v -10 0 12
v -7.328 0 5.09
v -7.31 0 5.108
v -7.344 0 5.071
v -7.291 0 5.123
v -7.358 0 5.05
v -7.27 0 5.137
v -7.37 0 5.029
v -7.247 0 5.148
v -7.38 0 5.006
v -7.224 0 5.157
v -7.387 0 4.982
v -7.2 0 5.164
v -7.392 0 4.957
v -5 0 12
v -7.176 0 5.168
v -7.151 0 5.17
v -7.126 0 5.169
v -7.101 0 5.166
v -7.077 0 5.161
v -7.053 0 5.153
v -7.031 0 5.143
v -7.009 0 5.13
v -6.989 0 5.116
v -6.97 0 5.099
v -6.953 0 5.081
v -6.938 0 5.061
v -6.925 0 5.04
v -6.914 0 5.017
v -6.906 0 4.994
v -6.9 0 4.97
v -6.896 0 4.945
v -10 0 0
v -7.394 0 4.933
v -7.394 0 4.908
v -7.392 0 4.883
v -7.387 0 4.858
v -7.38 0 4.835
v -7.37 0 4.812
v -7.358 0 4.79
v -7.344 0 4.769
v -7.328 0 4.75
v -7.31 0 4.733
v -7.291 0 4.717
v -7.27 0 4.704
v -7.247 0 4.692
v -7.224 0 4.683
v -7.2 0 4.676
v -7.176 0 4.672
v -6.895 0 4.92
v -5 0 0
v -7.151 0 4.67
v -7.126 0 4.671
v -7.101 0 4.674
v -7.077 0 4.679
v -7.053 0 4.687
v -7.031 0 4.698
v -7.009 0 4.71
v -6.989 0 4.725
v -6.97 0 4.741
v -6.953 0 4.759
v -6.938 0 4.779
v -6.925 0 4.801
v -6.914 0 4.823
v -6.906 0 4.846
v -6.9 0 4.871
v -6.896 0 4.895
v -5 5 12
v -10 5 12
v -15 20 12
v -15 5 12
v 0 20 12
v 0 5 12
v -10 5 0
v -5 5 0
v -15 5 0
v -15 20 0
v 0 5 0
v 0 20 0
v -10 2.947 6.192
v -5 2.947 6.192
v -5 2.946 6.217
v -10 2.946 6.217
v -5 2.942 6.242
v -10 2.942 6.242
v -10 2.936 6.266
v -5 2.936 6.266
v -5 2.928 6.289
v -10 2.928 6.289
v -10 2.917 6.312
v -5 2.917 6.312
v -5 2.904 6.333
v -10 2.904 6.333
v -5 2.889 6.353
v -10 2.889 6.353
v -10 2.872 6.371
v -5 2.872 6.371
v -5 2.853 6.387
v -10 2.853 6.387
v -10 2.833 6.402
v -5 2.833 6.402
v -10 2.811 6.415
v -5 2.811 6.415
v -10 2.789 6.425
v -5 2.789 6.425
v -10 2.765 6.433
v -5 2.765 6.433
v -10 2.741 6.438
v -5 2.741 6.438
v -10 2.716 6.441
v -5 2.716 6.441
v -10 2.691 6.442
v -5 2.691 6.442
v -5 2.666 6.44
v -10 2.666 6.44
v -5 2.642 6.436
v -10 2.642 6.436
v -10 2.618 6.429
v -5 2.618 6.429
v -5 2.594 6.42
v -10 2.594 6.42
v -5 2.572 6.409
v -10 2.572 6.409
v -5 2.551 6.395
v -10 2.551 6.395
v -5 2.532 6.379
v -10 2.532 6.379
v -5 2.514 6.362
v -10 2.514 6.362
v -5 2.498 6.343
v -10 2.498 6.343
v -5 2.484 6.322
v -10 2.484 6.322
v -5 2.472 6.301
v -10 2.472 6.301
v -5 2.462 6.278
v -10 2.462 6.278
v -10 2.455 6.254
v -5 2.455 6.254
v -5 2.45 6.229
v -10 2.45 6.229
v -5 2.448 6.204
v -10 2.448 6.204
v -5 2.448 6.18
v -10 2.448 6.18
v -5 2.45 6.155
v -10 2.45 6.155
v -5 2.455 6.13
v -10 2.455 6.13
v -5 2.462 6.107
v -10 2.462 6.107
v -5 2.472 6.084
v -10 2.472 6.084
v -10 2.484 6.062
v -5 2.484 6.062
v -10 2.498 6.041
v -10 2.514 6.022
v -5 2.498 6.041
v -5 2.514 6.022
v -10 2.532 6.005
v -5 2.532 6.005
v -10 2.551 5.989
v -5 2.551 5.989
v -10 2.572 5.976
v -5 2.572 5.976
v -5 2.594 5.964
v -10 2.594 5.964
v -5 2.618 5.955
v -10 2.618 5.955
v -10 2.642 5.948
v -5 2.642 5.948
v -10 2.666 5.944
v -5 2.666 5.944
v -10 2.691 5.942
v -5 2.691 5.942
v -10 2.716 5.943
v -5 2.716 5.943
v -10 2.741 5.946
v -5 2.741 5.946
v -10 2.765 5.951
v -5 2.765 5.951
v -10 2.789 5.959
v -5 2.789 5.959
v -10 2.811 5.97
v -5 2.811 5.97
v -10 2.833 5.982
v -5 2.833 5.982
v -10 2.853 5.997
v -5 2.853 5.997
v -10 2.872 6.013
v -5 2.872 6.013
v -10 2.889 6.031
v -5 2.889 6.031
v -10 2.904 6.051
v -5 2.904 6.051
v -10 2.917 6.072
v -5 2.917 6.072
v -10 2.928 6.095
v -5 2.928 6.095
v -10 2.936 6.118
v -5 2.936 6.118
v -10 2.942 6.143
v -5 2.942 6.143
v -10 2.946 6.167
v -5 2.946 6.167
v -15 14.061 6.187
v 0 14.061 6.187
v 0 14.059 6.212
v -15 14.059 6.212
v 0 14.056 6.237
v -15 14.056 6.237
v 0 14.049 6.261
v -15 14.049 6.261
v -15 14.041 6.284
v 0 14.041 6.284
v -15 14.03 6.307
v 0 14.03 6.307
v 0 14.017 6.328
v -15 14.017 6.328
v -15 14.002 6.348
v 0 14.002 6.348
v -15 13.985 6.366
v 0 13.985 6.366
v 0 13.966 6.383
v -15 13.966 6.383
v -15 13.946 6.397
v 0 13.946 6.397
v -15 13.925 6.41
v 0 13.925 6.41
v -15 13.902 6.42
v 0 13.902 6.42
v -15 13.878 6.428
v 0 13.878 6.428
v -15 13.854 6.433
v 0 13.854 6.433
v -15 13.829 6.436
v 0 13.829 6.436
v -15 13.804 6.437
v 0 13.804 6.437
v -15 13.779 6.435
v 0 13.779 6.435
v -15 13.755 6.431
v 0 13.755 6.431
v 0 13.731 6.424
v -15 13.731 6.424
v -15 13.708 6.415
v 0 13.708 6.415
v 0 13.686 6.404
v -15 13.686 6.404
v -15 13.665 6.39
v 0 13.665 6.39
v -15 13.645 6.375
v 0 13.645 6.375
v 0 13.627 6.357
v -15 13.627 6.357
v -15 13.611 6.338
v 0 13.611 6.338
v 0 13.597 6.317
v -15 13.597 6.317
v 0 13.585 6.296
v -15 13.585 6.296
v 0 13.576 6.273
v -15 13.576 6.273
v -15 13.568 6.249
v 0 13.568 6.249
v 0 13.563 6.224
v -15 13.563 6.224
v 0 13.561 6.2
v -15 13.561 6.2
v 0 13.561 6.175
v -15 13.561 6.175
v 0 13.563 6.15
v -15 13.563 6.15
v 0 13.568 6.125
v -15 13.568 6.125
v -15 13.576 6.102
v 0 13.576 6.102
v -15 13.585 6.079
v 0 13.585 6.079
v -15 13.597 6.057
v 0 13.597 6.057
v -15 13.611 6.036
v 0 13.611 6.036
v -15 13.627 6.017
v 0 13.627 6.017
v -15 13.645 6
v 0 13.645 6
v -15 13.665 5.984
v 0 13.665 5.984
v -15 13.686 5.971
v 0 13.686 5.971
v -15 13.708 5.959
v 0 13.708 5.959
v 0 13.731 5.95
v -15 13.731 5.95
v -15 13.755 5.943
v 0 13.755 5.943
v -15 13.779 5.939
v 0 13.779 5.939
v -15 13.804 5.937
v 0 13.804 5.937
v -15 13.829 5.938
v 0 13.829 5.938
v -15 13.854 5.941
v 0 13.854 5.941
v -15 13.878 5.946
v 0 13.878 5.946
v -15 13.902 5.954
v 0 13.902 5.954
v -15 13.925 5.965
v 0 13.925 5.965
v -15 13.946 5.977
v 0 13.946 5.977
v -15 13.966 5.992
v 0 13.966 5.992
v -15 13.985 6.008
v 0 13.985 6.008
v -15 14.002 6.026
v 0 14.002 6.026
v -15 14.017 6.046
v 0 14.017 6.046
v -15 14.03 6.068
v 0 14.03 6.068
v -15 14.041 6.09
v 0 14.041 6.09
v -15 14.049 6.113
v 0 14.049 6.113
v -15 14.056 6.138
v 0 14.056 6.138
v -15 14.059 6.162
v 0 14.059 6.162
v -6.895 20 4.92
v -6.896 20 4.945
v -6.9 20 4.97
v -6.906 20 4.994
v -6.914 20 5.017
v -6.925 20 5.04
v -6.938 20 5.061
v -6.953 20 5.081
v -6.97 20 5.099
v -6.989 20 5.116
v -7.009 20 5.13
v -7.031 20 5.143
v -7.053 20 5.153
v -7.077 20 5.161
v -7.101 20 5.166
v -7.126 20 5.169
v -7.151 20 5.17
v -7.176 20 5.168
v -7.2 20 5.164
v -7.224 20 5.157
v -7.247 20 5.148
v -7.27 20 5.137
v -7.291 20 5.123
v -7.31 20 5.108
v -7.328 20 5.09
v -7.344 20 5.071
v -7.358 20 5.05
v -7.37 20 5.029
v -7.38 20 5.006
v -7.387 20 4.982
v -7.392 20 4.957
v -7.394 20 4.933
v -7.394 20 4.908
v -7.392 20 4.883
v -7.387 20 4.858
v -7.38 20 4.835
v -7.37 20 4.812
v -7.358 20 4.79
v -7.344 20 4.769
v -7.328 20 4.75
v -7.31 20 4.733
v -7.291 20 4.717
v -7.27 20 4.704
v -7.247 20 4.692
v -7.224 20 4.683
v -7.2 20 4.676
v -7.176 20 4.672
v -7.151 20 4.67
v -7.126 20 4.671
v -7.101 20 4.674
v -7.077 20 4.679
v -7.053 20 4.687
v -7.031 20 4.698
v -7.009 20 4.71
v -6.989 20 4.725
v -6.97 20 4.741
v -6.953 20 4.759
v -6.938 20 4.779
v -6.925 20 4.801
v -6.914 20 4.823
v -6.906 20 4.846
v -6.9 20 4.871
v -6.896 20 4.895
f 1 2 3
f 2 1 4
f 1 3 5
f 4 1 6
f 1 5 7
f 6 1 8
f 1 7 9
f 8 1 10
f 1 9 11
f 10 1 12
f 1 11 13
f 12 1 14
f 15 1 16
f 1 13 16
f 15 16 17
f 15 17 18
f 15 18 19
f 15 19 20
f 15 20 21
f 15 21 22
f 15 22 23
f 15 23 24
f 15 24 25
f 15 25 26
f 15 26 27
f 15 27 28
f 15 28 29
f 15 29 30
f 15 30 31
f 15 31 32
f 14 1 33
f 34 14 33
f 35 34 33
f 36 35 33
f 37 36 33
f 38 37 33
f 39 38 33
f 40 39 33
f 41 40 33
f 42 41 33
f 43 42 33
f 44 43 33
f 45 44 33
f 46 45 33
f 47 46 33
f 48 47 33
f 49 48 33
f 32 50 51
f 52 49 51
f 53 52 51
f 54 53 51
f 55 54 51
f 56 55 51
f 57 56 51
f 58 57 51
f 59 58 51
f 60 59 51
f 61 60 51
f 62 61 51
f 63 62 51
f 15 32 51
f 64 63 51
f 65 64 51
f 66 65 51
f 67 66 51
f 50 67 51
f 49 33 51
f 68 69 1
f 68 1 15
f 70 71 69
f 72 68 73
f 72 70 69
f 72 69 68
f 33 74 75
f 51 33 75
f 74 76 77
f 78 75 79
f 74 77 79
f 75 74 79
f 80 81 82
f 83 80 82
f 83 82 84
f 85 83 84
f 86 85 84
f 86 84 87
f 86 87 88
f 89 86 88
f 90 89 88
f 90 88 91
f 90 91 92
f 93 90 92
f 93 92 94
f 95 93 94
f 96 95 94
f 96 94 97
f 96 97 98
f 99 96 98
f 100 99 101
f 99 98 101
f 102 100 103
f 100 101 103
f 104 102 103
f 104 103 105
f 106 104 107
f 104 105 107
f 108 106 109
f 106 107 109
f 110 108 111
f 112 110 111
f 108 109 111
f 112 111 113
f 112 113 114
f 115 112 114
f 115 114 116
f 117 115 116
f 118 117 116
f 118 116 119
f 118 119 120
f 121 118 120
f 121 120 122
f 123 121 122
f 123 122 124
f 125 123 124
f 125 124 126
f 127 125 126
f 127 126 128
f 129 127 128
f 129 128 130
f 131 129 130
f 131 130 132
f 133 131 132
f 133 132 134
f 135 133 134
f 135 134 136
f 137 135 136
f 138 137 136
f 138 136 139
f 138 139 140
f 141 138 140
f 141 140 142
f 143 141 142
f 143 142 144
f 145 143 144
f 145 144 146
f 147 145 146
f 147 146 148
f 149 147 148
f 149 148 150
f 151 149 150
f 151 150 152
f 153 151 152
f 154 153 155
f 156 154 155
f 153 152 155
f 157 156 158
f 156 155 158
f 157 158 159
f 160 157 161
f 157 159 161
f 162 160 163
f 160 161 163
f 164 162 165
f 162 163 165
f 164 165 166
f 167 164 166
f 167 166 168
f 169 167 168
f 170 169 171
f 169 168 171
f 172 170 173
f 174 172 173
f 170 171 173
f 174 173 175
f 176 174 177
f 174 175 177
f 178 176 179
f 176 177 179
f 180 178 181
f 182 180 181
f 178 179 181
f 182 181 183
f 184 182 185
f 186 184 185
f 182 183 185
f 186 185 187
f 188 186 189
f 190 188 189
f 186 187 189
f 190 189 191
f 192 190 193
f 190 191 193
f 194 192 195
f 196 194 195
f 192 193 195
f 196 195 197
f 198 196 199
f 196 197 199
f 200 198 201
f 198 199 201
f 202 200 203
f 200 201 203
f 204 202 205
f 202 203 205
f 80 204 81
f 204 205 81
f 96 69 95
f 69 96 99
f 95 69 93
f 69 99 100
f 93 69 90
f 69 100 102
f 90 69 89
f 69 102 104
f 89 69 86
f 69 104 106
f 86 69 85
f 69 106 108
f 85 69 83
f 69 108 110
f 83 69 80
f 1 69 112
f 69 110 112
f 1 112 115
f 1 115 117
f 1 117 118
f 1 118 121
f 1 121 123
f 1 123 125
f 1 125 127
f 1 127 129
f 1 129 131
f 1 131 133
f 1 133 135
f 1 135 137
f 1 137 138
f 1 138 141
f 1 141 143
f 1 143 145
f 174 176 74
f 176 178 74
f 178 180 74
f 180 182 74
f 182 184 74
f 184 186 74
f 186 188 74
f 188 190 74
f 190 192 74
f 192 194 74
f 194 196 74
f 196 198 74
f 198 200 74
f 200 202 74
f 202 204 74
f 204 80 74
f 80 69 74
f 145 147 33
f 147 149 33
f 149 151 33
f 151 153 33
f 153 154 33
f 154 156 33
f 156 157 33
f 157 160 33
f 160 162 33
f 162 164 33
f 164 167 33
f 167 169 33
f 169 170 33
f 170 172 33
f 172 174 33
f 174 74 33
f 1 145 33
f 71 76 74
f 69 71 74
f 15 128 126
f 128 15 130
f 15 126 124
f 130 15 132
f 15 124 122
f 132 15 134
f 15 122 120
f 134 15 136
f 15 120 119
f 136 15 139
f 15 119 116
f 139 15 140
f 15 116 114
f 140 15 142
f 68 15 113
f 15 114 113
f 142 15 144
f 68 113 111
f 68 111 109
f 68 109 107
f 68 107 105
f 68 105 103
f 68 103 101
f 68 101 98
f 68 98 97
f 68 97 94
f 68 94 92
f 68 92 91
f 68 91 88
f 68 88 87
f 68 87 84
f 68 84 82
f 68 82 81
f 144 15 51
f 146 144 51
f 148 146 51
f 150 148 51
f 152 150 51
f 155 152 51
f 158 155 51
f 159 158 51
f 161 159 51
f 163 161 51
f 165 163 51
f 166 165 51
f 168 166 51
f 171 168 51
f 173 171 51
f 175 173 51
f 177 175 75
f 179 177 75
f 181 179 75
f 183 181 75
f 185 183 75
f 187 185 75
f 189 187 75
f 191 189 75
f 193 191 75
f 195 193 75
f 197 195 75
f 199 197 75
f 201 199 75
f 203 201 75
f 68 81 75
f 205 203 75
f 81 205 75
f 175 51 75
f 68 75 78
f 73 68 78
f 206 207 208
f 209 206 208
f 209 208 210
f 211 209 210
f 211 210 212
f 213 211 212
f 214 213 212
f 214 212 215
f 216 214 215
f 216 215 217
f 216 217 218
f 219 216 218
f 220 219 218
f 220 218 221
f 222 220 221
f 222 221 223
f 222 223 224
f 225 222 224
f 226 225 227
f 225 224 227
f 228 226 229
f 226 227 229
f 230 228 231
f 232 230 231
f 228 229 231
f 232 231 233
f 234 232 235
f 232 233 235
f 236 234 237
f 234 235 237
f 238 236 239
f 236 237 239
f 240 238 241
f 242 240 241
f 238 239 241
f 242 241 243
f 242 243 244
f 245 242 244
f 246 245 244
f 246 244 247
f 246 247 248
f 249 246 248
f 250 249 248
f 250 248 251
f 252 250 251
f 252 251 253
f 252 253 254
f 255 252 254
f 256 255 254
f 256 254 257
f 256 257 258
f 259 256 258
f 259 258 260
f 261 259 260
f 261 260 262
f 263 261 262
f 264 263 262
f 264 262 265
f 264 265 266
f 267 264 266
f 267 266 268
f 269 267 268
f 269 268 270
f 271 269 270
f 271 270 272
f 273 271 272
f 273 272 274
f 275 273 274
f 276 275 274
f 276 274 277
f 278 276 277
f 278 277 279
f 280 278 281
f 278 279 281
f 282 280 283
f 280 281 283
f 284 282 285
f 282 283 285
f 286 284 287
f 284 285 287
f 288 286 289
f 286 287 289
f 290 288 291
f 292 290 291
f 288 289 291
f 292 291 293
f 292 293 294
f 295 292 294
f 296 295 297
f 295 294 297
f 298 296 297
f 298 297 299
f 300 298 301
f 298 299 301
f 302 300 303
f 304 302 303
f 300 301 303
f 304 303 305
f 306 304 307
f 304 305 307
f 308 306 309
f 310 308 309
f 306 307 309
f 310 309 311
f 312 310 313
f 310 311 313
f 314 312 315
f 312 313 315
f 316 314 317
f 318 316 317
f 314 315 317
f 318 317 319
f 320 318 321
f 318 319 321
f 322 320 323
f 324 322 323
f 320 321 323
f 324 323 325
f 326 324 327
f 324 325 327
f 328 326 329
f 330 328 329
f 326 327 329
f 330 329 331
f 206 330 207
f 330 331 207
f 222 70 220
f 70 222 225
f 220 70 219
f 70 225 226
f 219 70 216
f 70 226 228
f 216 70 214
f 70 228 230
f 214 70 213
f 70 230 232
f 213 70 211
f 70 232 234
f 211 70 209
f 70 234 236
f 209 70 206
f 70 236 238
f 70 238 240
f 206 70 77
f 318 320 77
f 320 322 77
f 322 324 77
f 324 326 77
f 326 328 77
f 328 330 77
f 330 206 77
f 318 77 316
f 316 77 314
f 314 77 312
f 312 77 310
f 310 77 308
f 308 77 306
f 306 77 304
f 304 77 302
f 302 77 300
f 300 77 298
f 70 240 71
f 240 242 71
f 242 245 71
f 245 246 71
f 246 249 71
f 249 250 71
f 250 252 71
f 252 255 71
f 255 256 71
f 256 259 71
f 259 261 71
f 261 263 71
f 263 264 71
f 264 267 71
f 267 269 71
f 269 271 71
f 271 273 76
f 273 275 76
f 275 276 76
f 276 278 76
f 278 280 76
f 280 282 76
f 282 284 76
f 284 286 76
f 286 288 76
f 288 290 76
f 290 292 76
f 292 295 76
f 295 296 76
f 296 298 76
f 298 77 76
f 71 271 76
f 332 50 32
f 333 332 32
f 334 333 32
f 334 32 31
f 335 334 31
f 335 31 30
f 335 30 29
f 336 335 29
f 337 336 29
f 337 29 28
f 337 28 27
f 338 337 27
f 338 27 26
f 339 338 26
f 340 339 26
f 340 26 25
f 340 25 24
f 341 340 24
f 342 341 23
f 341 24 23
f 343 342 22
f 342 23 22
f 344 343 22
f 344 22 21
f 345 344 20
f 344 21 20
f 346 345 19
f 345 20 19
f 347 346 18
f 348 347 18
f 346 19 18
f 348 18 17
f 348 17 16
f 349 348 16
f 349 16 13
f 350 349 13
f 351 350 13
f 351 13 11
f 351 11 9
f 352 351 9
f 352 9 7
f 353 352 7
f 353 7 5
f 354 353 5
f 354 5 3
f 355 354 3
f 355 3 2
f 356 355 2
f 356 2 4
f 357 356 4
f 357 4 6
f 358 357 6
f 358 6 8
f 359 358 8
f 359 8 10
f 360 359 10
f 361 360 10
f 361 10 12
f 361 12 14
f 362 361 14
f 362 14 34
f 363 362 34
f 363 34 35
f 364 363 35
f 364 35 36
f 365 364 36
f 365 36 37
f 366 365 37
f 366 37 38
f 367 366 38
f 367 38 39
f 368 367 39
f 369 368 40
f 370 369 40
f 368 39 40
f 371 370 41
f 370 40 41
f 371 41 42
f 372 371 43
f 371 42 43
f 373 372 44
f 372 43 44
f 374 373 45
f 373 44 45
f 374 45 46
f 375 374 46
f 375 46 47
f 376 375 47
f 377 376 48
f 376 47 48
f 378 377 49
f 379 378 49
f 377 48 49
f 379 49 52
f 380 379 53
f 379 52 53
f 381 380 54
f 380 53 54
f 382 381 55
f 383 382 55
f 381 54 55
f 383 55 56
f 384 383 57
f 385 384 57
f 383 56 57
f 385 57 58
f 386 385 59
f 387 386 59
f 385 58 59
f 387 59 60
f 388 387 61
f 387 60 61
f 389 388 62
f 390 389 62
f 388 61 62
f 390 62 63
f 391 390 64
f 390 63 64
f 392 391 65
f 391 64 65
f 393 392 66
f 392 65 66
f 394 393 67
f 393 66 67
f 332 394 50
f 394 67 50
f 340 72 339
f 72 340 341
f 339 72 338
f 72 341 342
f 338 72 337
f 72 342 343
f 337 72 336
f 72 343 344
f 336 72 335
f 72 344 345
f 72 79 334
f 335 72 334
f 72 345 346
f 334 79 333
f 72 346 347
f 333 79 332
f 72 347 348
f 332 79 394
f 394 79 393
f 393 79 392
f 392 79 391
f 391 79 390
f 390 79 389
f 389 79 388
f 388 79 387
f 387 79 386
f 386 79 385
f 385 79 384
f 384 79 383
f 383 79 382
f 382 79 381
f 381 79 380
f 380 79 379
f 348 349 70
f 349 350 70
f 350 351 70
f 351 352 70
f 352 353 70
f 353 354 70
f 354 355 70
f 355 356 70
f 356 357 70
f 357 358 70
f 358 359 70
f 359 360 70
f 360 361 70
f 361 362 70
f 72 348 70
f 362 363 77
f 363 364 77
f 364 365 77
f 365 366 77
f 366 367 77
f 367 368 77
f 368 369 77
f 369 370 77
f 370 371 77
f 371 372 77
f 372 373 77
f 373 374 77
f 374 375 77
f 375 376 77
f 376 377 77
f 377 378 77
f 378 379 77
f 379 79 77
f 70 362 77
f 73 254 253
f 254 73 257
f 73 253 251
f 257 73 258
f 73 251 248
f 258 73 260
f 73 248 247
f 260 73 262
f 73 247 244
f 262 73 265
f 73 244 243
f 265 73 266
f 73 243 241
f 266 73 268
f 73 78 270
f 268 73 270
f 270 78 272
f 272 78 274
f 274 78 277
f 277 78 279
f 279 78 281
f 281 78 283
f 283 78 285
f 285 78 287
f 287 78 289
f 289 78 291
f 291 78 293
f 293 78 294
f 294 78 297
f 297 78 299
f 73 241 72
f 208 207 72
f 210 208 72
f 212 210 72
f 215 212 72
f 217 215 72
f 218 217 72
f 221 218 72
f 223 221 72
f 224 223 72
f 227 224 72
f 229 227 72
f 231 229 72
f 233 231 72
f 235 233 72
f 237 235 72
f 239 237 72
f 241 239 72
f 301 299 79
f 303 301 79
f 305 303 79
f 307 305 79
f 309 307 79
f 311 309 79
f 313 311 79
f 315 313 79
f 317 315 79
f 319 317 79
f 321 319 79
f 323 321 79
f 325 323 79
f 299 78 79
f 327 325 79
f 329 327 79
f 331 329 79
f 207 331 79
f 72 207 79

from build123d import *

# Parameters (mm, degrees)
F1_DEPTH = 12
F2_R     = 0.25
F3_DEPTH = 52.1
F4_R     = 0.25
F5_DEPTH = 44
F6_R     = 0.25
F7_DEPTH = 57


with BuildPart() as f1:
    # F0 (on Top) → F1 (new body)
    with BuildSketch(Plane.XY):
        Polygon((0, 20), (-15, 20), (-15, 5), (-10, 5), (-10, 0), (-5, 0), (-5, 5), (0, 5), align=None)
    extrude(amount=F1_DEPTH)

    # F2 (on Right) → F3 (cut)
    with BuildSketch(Plane.YZ):
        with Locations((13.81054, 6.187139)):
            Circle(F2_R)
    extrude(amount=-F3_DEPTH, mode=Mode.SUBTRACT)

    # F4 (on Front) → F5 (cut)
    with BuildSketch(Plane.XZ):
        with Locations((-7.144658, 4.92007)):
            Circle(F4_R)
    extrude(amount=-F5_DEPTH, mode=Mode.SUBTRACT)

    # F6 (on Right) → F7 (cut)
    with BuildSketch(Plane.YZ):
        with Locations((2.697288, 6.192037)):
            Circle(F6_R)
    extrude(amount=-F7_DEPTH, mode=Mode.SUBTRACT)


solid = f1.part
